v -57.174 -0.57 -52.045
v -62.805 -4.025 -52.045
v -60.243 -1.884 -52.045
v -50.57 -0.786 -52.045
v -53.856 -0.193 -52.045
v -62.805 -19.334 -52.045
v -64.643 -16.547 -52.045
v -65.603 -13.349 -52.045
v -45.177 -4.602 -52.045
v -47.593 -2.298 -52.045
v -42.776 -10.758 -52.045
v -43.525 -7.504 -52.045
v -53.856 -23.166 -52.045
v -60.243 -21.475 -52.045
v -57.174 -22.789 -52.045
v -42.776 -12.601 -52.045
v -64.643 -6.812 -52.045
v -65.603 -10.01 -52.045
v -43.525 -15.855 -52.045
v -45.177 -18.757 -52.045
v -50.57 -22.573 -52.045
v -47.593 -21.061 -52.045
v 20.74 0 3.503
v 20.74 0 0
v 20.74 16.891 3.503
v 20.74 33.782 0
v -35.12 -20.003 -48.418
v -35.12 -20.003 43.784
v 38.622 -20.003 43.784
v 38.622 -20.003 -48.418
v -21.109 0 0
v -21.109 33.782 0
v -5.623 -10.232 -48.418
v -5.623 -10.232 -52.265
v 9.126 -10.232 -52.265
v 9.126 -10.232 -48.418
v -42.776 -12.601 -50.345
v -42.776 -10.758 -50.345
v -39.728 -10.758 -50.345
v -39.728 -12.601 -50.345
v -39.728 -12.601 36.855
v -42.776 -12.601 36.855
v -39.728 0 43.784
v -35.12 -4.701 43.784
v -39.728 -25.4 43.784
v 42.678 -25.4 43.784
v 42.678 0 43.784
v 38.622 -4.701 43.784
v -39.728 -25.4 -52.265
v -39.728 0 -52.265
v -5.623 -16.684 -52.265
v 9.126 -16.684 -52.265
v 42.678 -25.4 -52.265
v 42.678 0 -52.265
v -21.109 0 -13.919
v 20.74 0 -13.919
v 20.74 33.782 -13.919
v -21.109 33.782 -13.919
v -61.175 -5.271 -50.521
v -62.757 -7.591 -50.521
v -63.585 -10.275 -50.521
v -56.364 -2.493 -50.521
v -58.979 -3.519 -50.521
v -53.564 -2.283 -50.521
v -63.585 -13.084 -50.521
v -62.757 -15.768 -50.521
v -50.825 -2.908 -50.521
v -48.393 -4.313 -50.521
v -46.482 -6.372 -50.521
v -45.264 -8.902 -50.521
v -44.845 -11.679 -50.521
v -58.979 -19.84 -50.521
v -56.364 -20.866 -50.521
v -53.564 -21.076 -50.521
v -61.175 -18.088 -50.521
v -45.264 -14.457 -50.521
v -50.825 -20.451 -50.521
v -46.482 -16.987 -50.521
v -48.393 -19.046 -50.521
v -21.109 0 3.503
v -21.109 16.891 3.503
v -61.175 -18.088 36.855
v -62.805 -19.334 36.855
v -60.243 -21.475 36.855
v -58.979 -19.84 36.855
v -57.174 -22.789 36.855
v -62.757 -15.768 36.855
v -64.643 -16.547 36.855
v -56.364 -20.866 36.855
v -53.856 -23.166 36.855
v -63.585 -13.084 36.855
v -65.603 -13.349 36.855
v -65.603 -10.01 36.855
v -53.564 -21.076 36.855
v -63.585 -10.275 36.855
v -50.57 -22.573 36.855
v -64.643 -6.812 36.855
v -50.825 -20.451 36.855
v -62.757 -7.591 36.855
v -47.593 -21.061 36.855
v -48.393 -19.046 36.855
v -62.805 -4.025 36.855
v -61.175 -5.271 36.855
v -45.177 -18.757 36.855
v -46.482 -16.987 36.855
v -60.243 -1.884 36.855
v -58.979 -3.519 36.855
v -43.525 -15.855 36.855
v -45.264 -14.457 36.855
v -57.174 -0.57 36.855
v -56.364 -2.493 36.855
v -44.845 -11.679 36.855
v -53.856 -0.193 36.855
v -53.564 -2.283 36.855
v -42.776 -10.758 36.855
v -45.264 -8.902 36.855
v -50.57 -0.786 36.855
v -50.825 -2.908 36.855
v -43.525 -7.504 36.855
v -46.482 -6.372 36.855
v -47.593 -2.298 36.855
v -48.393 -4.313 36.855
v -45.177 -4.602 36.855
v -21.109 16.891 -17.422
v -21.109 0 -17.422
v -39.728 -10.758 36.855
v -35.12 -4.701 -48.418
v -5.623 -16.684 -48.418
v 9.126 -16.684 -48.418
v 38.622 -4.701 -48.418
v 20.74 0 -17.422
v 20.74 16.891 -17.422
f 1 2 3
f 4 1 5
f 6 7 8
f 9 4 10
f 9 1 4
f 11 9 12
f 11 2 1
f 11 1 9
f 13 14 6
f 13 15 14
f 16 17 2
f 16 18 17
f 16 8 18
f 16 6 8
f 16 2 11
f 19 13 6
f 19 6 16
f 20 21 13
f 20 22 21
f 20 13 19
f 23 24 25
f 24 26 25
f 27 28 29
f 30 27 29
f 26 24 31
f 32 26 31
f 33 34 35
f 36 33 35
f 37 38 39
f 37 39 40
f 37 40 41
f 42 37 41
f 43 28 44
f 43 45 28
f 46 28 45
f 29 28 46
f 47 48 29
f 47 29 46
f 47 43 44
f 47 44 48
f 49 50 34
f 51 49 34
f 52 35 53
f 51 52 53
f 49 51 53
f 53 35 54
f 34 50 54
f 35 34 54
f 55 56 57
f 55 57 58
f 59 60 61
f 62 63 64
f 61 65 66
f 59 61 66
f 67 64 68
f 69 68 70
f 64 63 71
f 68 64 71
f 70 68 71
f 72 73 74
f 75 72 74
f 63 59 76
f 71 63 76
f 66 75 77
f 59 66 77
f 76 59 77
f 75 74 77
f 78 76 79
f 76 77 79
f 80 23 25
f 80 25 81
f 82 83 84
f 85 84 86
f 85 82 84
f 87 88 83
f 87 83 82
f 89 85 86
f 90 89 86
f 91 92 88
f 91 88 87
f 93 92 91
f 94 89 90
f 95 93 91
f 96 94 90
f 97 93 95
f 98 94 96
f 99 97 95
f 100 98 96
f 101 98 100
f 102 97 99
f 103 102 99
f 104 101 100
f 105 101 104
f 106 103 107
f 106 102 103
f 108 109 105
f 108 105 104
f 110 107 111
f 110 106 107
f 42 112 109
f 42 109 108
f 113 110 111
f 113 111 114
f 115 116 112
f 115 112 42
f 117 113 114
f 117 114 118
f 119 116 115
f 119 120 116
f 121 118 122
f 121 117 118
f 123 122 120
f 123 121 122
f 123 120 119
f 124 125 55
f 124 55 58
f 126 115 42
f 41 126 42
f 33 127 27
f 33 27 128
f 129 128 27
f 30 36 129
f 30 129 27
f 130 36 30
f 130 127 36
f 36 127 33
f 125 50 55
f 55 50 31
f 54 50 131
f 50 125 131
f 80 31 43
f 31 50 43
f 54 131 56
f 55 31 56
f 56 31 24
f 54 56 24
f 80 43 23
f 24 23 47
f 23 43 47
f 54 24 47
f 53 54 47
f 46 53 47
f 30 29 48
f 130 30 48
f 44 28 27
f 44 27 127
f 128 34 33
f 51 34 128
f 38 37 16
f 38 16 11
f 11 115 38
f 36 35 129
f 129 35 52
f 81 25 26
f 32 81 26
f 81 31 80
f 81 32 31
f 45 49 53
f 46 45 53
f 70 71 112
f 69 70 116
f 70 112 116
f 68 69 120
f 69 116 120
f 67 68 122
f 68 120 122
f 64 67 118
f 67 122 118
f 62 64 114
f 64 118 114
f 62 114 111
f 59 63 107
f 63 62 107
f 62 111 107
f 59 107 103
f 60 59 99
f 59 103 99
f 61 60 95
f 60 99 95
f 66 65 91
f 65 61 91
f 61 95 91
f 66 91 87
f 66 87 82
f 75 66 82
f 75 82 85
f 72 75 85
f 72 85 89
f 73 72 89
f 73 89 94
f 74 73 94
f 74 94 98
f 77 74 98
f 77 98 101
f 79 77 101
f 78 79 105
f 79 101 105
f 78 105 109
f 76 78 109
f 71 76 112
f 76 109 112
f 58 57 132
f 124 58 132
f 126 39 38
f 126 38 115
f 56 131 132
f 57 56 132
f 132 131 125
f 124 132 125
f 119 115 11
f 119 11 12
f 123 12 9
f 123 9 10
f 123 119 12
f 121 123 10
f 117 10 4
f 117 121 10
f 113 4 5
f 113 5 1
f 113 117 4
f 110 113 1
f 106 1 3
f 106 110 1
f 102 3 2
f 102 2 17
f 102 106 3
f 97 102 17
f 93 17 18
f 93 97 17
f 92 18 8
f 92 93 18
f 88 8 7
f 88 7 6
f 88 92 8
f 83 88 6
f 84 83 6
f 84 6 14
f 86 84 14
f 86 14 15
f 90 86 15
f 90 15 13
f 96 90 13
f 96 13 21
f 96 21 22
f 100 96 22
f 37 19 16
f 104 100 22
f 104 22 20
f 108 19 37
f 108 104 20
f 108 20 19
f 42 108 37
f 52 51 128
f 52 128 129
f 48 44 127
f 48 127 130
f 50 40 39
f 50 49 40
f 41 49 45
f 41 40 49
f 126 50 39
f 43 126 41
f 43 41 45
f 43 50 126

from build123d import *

# Parameters (mm, degrees)
F0_W      = 82.406614
F0_H      = 96.04887
F1_DEPTH  = 25.4
F2_W      = 73.741935
F2_H      = 15.301453
F3_DEPTH  = 92.202
F4_W      = 41.848549
F4_H      = 3.502742
F5_DEPTH  = 33.782
F7_DEPTH  = 58.928
F9_DEPTH  = 50.292
F10_W     = 14.748386
F10_H     = 6.452419
F11_DEPTH = 25.4
F12_W     = 1.843547
F12_H     = 87.199841
F13_DEPTH = 3.048
F14_R     = 9.422481
F15_DEPTH = 88.9
F16_R     = 9.422481
F17_DEPTH = 1.524


with BuildPart() as f1:
    # F0 (on Front) → F1 (new body)
    with BuildSketch(Plane.XZ):
        with Locations((1.474841, -4.240159)):
            Rectangle(F0_W, F0_H)
    extrude(amount=F1_DEPTH)

    # F2 (on face) → F3 (cut)
    with BuildSketch(Plane.XY.offset(43.784276)):
        with Locations((1.751371, -12.351774)):
            Rectangle(F2_W, F2_H)
    extrude(amount=-F3_DEPTH, mode=Mode.SUBTRACT)

    # F4 (on face) → F5 (join)
    with BuildSketch(Plane(origin=(0, 0, 0), x_dir=(-1, 0, 0), z_dir=(0, 1, 0))):
        with Locations((0.184355, 1.751371)):
            Rectangle(F4_W, F4_H)
        with Locations((0.184355, -15.670161)):
            Rectangle(F4_W, F4_H)
    extrude(amount=F5_DEPTH)

    # F6 (on face) → F7 (cut)
    with BuildSketch(Plane.YZ.offset(20.73992)):
        Polygon((33.782, 3.502742), (16.891, 3.502742), (33.782, 0), align=None)
    extrude(amount=-F7_DEPTH, mode=Mode.SUBTRACT)

    # F8 (on face) → F9 (cut)
    with BuildSketch(Plane.YZ.offset(20.73992)):
        Polygon((33.782, -13.91879), (16.891, -17.421532), (33.782, -17.421532), align=None)
    extrude(amount=-F9_DEPTH, mode=Mode.SUBTRACT)

    # F10 (on face) → F11 (cut)
    with BuildSketch(Plane(origin=(0, 0, -52.264594), x_dir=(1, 0, 0), z_dir=(0, 0, -1))):
        with Locations((1.75137, 13.457904)):
            Rectangle(F10_W, F10_H)
    extrude(amount=-F11_DEPTH, mode=Mode.SUBTRACT)

    # F12 (on face) → F13 (join)
    with BuildSketch(Plane(origin=(-39.728466, 0, 0), x_dir=(0, -1, 0), z_dir=(-1, 0, 0))):
        with Locations((11.679495, -6.745199)):
            Rectangle(F12_W, F12_H)
    extrude(amount=F13_DEPTH)

    # F14 (on face) → F15 (join)
    with BuildSketch(Plane.XY.offset(36.854722)):
        with BuildLine():
            Line((-42.776466, -12.601268), (-42.776466, -10.757721))
            ThreePointArc((-42.776466, -10.757721), (-65.724916, -11.679494), (-42.776466, -12.601268))
        make_face()
        with Locations((-54.267689, -11.679494)):
            Circle(F14_R, mode=Mode.SUBTRACT)
    extrude(amount=-F15_DEPTH)

    # F16 (on face) → F17 (join)
    with BuildSketch(Plane(origin=(0, 0, -52.045278), x_dir=(1, 0, 0), z_dir=(0, 0, -1))):
        with Locations((-54.267689, 11.679494)):
            Circle(F16_R)
    extrude(amount=-F17_DEPTH)


solid = f1.part
